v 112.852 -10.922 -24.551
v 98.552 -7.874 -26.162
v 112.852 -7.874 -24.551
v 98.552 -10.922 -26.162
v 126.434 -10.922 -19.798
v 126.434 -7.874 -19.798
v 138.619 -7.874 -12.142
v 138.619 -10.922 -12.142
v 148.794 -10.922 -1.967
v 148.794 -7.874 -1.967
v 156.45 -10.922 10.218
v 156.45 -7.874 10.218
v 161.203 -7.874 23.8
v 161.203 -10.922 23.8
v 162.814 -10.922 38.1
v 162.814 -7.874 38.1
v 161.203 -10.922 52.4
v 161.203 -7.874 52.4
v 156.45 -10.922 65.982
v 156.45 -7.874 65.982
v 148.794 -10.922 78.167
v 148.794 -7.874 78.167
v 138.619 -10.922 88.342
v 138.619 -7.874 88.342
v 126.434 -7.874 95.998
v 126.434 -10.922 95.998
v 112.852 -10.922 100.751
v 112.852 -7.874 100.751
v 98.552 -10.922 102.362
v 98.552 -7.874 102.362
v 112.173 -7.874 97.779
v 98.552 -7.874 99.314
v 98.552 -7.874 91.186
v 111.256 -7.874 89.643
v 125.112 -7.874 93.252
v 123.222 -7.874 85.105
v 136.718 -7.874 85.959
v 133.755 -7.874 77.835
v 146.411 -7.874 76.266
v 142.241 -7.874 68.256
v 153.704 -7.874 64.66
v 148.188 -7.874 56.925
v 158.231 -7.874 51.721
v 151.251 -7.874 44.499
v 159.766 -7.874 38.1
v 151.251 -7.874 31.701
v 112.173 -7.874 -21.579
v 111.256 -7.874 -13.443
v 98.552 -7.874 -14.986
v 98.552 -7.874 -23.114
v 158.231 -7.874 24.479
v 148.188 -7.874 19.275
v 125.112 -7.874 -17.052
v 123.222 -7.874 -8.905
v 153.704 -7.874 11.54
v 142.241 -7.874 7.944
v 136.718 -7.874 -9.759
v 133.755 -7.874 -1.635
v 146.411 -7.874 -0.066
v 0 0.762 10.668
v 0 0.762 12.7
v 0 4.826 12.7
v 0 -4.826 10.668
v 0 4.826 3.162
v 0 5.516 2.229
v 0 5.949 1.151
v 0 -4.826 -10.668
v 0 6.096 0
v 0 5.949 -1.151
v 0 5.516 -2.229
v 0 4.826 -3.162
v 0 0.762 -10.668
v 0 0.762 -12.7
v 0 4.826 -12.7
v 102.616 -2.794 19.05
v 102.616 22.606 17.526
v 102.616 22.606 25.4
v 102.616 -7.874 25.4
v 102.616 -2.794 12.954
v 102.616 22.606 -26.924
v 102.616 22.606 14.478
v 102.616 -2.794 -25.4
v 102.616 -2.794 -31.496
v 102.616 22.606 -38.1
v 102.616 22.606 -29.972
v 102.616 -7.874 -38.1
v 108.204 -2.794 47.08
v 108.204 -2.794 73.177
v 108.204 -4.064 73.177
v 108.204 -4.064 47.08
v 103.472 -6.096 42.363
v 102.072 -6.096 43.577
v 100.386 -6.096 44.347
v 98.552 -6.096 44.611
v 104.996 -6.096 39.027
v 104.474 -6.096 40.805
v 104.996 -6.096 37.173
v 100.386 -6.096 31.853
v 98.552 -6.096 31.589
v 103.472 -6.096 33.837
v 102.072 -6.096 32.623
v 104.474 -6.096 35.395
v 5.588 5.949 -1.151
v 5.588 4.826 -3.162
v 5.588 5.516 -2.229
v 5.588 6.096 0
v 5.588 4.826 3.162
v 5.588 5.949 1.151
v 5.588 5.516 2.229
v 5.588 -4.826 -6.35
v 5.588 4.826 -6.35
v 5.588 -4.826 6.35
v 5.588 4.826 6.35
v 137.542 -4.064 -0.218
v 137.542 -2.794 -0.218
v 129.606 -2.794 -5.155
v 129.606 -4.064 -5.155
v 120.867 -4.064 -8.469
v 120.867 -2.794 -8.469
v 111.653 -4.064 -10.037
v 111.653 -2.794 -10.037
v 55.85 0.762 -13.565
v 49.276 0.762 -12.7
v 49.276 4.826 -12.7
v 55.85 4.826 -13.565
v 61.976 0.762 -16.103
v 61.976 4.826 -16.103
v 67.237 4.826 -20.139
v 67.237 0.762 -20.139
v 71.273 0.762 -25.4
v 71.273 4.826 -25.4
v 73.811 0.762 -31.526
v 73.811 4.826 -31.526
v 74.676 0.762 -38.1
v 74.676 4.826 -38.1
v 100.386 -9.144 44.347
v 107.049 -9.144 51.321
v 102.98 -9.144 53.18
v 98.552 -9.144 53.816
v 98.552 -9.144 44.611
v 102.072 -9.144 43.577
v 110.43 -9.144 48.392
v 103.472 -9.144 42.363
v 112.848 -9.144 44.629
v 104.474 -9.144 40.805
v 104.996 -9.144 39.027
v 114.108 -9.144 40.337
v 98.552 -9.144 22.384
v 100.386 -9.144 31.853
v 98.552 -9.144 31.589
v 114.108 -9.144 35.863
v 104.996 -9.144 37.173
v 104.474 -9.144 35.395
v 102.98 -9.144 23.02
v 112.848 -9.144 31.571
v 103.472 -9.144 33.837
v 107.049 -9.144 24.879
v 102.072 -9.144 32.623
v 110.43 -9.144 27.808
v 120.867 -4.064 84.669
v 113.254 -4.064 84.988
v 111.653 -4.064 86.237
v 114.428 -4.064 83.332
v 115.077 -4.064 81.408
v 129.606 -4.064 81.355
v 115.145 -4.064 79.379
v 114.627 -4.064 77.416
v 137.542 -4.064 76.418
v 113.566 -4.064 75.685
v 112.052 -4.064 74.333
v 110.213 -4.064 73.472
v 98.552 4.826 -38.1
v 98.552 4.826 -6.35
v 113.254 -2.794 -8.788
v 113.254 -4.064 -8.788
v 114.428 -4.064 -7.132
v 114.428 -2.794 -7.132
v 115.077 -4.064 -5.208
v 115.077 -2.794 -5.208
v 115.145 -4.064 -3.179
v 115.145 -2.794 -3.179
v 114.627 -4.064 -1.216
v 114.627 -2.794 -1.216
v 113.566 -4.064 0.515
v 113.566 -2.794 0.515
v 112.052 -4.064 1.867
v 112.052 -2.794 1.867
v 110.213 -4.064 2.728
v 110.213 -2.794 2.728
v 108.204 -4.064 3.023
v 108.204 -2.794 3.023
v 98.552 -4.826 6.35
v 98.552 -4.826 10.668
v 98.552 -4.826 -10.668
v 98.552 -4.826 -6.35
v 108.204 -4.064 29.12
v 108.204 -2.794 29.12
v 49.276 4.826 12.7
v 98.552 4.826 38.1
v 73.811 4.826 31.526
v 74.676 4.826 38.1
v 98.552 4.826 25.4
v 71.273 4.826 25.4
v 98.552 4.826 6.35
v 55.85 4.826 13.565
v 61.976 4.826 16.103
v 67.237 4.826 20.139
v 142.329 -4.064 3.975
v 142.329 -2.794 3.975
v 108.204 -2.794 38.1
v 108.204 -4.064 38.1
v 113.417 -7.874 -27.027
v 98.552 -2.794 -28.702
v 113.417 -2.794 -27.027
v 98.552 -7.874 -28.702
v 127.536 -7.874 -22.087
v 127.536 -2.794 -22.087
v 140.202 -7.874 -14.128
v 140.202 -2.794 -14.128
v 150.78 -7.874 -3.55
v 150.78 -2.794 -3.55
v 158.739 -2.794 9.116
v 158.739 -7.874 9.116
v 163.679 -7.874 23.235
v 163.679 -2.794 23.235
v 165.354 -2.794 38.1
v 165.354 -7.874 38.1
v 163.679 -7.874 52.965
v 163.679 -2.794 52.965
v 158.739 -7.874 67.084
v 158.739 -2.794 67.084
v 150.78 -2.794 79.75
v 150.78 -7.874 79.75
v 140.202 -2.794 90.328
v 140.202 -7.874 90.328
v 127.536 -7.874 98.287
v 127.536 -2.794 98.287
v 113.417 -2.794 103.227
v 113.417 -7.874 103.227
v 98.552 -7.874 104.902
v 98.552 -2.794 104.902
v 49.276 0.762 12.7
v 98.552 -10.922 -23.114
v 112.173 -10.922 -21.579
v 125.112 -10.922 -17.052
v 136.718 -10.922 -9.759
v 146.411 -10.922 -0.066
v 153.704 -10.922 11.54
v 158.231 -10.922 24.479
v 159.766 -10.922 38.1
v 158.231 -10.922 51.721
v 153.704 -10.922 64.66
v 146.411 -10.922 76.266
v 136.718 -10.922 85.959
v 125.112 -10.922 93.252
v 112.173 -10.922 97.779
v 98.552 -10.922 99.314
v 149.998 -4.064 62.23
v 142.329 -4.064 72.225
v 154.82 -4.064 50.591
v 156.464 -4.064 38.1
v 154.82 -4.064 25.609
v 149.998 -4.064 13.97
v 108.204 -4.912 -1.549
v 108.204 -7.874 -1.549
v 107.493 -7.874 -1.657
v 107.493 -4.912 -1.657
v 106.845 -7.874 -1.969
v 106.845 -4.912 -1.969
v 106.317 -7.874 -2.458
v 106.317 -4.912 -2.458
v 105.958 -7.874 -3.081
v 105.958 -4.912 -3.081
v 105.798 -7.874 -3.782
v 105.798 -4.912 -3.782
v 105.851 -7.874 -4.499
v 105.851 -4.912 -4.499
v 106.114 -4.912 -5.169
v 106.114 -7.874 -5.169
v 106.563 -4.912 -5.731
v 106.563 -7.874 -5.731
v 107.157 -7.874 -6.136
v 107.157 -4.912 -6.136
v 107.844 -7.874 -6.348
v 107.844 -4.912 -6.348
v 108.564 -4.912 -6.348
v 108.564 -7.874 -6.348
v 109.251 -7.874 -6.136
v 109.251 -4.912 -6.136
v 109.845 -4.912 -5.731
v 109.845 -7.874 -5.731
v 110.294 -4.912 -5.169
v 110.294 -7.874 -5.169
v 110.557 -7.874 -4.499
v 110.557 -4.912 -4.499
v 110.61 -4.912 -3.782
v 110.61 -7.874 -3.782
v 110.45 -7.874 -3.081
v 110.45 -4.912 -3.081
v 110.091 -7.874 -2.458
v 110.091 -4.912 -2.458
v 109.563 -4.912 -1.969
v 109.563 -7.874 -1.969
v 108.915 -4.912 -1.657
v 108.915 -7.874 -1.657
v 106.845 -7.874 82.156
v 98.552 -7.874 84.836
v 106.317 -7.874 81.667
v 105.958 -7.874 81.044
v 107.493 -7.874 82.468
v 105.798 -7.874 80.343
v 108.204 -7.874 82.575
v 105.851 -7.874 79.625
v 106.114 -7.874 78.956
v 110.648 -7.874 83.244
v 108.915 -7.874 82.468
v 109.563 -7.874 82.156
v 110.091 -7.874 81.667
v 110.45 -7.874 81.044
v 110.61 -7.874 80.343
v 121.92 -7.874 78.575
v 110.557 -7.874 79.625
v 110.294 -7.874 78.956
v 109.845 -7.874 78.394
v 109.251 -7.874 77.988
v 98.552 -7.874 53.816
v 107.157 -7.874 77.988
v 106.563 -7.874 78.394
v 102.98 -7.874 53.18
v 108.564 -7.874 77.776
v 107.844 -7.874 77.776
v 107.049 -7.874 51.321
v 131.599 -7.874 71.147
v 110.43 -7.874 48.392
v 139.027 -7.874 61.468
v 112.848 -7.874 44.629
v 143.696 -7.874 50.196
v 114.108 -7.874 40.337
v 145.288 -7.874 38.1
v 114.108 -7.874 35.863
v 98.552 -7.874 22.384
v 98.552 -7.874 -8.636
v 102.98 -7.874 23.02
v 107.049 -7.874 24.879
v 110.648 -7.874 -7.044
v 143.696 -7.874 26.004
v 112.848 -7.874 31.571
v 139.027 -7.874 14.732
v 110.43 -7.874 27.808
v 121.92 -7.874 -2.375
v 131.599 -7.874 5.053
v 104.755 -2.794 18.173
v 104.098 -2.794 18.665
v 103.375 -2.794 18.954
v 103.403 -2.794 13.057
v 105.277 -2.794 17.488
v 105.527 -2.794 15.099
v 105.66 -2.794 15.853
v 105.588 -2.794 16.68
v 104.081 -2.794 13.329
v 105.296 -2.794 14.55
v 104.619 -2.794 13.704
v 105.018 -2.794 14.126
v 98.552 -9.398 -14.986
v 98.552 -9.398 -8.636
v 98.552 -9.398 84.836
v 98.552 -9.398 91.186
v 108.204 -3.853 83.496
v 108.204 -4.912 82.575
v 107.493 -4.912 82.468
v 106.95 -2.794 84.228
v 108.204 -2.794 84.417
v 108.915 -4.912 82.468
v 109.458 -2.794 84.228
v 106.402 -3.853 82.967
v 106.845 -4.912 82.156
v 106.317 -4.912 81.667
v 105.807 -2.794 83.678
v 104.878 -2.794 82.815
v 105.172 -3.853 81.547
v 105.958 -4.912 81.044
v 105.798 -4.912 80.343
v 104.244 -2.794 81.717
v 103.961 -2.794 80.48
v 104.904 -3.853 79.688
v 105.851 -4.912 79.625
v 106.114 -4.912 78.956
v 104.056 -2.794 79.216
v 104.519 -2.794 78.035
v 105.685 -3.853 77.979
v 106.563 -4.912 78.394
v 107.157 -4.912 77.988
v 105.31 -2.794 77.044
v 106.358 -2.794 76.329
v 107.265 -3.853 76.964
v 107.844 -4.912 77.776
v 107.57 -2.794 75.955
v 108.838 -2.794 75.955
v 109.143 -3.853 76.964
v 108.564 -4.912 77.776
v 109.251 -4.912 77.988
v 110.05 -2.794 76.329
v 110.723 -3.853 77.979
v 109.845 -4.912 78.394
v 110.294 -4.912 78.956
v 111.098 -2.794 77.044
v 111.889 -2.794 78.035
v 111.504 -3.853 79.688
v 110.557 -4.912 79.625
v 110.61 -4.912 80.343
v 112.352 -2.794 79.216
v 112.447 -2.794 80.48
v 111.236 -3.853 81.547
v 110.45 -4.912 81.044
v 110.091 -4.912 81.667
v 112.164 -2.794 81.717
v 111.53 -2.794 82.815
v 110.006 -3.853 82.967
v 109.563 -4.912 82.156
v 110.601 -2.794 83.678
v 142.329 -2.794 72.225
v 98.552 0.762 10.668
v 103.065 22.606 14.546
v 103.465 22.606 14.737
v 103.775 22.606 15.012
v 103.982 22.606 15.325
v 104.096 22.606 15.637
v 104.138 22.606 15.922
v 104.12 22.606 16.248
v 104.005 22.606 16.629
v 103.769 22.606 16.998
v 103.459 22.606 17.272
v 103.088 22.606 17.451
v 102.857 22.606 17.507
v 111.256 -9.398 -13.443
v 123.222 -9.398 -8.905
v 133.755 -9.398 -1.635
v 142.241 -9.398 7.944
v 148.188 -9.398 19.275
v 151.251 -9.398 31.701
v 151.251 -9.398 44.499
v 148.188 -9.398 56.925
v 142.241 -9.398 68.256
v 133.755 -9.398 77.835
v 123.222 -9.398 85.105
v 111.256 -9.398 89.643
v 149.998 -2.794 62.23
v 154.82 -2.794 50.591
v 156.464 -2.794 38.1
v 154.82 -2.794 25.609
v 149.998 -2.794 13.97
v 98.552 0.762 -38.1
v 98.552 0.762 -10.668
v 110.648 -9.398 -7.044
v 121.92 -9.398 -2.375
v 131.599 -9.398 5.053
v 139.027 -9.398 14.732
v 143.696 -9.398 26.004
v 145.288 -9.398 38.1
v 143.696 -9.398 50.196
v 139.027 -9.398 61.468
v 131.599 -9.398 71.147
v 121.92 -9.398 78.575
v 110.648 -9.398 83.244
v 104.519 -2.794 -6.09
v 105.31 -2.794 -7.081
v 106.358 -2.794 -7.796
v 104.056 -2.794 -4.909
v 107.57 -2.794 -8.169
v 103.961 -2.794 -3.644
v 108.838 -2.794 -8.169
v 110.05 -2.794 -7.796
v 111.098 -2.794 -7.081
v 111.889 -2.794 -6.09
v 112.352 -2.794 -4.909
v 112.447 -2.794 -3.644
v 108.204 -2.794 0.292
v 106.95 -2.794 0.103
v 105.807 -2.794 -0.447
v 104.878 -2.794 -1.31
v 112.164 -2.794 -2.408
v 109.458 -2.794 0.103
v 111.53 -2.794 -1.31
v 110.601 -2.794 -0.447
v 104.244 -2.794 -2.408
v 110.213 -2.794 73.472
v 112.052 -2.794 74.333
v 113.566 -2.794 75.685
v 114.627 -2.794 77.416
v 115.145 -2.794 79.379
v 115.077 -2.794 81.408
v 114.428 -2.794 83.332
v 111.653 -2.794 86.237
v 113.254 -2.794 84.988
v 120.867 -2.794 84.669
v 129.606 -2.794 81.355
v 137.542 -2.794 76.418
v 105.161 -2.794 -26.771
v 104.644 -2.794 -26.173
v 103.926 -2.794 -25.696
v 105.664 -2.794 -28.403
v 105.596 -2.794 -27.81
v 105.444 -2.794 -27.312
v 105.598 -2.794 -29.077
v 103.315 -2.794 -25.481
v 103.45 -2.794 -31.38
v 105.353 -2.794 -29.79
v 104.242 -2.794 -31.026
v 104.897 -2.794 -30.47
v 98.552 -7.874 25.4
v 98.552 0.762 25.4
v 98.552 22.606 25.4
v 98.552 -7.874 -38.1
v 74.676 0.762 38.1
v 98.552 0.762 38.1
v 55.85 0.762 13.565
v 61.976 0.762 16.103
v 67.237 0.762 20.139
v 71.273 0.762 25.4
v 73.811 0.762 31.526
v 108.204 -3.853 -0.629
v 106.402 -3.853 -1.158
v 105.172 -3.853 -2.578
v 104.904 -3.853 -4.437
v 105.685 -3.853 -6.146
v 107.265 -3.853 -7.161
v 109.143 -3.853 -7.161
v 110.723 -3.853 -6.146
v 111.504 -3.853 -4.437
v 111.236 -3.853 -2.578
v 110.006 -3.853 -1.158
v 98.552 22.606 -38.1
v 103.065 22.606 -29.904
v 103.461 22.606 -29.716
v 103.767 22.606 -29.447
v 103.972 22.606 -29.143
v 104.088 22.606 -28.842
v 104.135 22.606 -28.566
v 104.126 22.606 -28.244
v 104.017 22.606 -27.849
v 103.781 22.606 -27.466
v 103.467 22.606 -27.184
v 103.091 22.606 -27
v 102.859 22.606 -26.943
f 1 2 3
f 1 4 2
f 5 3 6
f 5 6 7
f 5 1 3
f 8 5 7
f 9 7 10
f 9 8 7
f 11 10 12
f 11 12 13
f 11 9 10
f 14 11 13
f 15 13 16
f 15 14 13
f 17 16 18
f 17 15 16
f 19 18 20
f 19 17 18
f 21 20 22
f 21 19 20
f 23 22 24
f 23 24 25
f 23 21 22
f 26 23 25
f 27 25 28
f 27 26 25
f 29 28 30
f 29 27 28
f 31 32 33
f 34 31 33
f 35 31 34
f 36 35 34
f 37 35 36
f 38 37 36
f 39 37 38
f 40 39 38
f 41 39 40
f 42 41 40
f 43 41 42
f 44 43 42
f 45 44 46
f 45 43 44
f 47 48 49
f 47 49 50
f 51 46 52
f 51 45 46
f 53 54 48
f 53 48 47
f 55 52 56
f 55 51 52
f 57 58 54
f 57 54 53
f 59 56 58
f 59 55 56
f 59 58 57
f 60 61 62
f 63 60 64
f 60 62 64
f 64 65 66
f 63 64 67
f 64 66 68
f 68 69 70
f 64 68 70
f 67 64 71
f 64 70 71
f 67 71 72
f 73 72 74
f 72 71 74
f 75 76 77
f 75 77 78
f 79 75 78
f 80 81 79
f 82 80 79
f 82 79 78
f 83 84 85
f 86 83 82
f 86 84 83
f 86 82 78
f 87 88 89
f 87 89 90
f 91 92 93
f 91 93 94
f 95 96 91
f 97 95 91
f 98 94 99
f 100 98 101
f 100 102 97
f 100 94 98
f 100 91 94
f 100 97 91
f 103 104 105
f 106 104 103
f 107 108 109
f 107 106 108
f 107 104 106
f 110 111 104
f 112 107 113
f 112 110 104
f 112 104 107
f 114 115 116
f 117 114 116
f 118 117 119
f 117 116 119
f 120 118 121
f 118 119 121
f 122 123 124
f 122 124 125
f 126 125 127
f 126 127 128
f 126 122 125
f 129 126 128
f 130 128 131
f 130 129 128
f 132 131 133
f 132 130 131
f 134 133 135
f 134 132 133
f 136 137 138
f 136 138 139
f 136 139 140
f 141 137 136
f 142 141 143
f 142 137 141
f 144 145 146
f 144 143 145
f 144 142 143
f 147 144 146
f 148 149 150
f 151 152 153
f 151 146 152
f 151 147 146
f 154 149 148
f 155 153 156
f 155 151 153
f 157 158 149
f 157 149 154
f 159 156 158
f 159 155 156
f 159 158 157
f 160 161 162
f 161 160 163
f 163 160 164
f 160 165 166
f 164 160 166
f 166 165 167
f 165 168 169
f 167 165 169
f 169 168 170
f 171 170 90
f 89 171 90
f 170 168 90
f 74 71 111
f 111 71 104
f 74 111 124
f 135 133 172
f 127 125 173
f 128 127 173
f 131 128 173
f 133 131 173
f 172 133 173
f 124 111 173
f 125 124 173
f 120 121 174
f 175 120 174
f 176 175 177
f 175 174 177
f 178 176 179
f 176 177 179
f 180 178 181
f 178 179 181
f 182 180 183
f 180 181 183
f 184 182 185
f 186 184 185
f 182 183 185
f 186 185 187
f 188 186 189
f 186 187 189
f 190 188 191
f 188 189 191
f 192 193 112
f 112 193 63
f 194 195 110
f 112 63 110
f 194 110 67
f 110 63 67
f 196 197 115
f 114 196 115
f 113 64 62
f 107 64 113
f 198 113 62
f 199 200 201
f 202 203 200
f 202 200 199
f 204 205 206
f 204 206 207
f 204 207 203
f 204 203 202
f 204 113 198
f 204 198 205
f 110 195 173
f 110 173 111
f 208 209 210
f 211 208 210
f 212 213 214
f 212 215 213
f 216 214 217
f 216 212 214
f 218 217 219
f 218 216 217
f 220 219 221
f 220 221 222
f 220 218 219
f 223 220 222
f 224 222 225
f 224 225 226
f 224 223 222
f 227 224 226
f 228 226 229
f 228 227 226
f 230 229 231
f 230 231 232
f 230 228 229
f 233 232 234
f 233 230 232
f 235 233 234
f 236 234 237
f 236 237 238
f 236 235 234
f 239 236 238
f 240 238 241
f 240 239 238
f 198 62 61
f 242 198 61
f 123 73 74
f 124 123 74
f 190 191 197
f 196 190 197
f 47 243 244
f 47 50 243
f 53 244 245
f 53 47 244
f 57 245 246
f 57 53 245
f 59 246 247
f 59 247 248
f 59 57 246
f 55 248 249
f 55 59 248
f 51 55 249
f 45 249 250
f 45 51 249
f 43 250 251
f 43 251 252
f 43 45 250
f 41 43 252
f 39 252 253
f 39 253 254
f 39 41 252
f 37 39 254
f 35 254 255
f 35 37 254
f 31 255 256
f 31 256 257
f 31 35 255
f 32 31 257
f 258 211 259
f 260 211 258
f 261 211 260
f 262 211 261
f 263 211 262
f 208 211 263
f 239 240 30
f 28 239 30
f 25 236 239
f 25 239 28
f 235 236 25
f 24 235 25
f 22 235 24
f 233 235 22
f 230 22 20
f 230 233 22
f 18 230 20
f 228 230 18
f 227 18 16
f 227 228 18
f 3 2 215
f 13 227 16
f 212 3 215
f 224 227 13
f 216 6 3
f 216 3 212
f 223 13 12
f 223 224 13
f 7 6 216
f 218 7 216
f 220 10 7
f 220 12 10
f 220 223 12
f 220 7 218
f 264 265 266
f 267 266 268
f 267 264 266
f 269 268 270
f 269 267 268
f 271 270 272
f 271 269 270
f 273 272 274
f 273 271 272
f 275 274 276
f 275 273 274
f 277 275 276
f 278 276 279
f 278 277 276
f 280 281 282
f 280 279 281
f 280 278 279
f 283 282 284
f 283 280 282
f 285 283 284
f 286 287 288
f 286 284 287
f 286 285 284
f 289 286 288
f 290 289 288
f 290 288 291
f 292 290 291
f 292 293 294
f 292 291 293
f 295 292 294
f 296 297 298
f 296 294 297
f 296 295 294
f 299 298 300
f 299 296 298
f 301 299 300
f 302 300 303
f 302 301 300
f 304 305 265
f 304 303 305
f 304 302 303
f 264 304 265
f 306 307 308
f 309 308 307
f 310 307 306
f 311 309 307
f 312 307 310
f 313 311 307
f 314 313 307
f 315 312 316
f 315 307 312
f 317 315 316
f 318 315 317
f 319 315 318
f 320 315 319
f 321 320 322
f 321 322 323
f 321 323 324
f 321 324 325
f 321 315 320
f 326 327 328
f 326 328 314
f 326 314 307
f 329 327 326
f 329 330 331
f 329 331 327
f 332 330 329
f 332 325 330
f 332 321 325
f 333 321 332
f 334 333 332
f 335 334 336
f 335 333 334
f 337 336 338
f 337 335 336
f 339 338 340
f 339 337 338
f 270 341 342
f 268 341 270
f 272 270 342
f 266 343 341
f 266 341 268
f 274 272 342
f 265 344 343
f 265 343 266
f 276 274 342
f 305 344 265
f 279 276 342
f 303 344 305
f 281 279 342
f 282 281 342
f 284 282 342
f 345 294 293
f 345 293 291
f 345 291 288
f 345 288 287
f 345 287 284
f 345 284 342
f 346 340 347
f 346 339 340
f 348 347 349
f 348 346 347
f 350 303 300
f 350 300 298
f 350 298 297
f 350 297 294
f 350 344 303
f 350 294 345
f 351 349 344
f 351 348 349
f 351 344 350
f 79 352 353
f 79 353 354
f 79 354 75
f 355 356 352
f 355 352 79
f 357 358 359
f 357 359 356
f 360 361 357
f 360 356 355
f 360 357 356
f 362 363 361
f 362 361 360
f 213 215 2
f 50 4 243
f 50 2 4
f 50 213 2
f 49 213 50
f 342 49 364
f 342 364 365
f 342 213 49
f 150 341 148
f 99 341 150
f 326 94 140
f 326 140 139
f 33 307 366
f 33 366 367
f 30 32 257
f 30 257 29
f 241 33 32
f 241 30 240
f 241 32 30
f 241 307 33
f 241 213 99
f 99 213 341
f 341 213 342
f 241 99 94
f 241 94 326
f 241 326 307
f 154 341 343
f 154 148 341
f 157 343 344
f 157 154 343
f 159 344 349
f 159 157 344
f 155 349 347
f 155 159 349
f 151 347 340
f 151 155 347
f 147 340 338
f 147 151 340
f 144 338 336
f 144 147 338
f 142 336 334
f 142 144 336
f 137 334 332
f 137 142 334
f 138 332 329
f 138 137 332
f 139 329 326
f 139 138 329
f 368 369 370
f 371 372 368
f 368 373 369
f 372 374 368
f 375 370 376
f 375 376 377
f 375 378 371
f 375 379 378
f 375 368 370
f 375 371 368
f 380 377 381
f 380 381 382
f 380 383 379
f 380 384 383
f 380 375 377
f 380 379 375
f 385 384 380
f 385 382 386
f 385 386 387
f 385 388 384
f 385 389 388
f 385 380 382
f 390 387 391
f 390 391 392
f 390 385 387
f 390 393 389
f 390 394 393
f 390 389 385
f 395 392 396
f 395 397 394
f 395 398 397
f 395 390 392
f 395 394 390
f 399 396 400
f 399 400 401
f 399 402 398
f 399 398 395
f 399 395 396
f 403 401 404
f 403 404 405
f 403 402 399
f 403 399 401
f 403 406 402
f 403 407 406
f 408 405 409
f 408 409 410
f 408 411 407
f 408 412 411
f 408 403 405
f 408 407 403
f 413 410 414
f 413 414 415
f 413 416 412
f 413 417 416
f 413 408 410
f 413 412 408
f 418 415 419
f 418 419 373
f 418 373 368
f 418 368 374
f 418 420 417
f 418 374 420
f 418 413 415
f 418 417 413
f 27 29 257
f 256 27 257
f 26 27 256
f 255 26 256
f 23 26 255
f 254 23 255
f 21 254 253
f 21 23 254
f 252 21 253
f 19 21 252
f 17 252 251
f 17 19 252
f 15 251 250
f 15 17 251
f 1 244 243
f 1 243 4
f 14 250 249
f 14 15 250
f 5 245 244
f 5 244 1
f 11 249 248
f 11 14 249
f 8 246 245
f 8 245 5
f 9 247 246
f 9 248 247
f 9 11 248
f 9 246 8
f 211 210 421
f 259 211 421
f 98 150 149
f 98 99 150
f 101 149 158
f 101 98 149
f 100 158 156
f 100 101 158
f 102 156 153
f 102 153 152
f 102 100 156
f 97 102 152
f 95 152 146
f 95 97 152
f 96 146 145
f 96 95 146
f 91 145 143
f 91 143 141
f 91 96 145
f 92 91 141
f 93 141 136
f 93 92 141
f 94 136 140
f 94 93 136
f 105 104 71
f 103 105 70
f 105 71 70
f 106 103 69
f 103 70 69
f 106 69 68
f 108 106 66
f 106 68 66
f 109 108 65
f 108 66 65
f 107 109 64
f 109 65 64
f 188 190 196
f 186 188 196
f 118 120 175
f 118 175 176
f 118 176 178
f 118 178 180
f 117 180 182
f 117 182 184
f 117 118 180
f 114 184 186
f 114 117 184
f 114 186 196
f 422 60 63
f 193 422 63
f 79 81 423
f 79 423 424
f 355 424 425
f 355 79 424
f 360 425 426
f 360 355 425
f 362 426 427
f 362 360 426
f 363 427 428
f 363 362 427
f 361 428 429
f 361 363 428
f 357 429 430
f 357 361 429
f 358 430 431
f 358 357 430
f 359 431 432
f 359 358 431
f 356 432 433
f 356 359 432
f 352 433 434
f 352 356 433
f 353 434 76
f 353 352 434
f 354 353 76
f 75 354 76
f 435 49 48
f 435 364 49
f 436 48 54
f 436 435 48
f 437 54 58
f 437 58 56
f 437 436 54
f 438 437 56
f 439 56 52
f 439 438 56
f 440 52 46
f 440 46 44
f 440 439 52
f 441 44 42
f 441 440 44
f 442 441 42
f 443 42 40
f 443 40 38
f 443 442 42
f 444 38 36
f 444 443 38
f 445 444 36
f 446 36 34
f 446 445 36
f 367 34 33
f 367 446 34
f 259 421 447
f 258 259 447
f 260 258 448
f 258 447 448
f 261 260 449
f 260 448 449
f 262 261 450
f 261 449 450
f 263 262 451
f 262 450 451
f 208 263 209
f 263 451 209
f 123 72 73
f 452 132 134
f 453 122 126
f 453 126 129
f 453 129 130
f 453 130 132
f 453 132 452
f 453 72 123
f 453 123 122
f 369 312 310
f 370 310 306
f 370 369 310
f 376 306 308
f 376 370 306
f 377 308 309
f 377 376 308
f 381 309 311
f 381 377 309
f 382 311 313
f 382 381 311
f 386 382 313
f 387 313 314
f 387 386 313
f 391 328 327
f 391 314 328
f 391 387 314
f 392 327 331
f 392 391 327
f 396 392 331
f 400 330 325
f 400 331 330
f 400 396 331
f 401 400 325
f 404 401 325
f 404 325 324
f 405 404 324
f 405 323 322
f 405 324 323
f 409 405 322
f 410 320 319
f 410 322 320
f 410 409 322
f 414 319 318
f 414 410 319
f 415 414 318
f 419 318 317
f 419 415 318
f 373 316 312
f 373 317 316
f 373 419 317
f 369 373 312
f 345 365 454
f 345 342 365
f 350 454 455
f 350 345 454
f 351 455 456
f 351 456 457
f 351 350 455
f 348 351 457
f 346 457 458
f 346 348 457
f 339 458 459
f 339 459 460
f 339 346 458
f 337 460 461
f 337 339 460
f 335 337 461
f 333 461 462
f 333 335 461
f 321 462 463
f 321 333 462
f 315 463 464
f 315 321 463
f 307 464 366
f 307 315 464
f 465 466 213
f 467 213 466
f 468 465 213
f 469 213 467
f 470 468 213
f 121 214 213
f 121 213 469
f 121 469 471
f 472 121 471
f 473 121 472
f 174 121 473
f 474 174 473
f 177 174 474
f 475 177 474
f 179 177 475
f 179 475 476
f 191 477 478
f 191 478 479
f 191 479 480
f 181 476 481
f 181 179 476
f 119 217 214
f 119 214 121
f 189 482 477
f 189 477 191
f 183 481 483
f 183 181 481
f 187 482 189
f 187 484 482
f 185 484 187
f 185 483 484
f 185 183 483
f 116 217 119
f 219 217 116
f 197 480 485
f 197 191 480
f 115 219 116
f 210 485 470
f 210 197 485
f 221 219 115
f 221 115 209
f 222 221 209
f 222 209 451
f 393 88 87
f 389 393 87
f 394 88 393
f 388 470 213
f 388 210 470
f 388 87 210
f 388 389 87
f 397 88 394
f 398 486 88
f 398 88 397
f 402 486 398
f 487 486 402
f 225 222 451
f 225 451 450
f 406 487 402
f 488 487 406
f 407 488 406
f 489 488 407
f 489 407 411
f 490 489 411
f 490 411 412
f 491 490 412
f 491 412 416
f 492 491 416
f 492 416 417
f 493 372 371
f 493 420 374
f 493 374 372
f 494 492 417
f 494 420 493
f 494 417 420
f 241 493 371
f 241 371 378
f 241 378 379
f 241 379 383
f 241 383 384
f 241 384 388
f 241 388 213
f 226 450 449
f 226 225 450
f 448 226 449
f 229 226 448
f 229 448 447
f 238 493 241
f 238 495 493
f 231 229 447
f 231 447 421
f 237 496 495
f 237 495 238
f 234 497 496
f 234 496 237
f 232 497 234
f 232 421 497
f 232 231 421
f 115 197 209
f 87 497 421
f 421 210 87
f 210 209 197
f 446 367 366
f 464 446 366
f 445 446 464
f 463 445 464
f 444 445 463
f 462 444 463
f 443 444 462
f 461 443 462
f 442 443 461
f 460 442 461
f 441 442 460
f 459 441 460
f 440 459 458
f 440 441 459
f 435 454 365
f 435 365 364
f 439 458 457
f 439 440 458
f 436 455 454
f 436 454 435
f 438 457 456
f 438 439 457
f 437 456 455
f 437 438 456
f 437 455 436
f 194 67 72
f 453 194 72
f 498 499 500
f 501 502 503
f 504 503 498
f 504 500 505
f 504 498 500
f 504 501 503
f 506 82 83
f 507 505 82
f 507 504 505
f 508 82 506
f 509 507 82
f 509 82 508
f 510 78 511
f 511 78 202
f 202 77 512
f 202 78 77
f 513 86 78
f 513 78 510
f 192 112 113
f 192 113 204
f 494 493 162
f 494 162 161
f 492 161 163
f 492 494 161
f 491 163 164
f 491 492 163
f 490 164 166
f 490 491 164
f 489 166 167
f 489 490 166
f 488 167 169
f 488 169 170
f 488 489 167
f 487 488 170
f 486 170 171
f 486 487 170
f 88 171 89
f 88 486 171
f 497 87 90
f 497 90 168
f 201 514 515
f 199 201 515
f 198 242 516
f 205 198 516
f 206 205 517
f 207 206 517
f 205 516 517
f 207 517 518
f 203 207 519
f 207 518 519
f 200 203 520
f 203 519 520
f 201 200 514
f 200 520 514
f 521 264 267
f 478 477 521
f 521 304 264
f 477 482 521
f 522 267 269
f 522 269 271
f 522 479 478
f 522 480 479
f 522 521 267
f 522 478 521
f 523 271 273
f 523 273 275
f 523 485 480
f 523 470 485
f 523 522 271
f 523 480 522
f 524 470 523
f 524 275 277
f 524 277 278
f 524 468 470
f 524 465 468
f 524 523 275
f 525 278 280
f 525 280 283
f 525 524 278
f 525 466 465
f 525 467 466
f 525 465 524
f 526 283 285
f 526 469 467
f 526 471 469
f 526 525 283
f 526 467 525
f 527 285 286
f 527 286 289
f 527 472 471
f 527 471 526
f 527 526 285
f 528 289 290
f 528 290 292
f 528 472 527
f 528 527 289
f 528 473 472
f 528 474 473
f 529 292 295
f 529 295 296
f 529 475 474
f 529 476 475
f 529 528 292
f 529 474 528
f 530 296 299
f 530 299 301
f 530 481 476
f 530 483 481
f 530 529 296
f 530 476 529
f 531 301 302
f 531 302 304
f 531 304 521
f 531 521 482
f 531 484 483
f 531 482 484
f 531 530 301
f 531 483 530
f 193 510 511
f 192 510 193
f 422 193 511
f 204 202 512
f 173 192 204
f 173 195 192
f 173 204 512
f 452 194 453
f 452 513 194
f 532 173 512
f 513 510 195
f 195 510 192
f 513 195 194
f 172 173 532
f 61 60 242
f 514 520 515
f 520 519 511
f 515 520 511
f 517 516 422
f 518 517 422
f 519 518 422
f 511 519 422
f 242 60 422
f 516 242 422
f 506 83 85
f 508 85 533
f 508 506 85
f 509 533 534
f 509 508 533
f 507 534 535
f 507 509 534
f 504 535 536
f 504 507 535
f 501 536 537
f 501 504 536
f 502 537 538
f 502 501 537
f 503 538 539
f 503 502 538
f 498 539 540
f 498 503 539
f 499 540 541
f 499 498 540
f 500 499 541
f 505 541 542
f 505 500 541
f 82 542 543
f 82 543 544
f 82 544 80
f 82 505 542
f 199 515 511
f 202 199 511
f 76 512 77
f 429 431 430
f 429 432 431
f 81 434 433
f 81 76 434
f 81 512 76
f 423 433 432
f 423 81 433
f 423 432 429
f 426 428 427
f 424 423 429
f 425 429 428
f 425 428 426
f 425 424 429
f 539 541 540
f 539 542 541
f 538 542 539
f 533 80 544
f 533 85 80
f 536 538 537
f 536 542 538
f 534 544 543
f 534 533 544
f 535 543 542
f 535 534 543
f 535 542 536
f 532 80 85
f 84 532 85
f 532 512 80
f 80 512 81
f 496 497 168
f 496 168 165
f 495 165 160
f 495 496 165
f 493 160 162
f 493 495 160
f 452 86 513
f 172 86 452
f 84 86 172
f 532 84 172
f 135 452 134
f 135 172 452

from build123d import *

# Parameters (mm, degrees)
BOSS_EXTRUDE1_DEPTH                           = 98.552
CUT_EXTRUDE2_DEPTH                            = 100.834602258
CUT_EXTRUDE2_DEPTH_BACK                       = 100.834602258
SKETCH2_W                                     = 92.964
SKETCH2_H                                     = 3.187725502
BOSS_EXTRUDE2_START                           = -4.064
BOSS_EXTRUDE2_DEPTH                           = 4.064
SKETCH10_W                                    = 4.064
SKETCH10_H                                    = 8.636
BOSS_EXTRUDE3_DEPTH                           = 63.5
REVOLVE1_ANGLE                                = 180
CUT_EXTRUDE3_DEPTH                            = 1.27
CSK_FOR_1_FLAT_HEAD_SOCKET_CAP_SCREW1_A_COUNT = 2
CSK_FOR_1_FLAT_HEAD_SOCKET_CAP_SCREW1_A_PITCH = 84.1248


with BuildPart() as part:
    # Sketch1 → Boss-Extrude1 (new body)
    with BuildSketch(Plane(origin=(0, 0, 0), x_dir=(0, 0, -1), z_dir=(1, 0, 0))):
        with BuildLine():
            Line((-10.668, -4.826), (10.668, -4.826))
            Line((10.668, -4.826), (10.668, 0.762))
            Line((10.668, 0.762), (12.7, 0.762))
            Line((12.7, 0.762), (12.7, 4.826))
            Line((12.7, 4.826), (3.162274498, 4.826))
            ThreePointArc((3.162274498, 4.826), (0, 6.096), (-3.162274498, 4.826))
            Line((-3.162274498, 4.826), (-12.7, 4.826))
            Line((-12.7, 4.826), (-12.7, 0.762))
            Line((-12.7, 0.762), (-10.668, 0.762))
            Line((-10.668, 0.762), (-10.668, -4.826))
        make_face()
    extrude(amount=BOSS_EXTRUDE1_DEPTH)

    # Sketch2 → Cut-Extrude2 (cut, two sides: drawn at the far end of the back side and taken through both)
    with BuildSketch(Plane(origin=(0, 4.826, 0), x_dir=(1, 0, 0), z_dir=(0, 1, 0)).offset(-CUT_EXTRUDE2_DEPTH_BACK)):
        with Locations((52.07, -4.756137249)):
            Rectangle(SKETCH2_W, SKETCH2_H)
        Polygon((5.588, 6.35), (5.588, 0), (5.588, -3.162274498), (98.552, -3.162274498), (98.552, 6.35), align=None)
    extrude(amount=CUT_EXTRUDE2_DEPTH + CUT_EXTRUDE2_DEPTH_BACK, mode=Mode.SUBTRACT)

    # Sketch3 → Boss-Extrude2 (add)
    with BuildSketch(Plane(origin=(0, 4.826, 0), x_dir=(1, 0, 0), z_dir=(0, 1, 0)).offset(BOSS_EXTRUDE2_START)):
        with BuildLine():
            Line((98.552, -12.7), (49.276, -12.7))
            ThreePointArc((49.276, -12.7), (67.236512242, -20.139487758), (74.676, -38.1))
            Line((74.676, -38.1), (98.552, -38.1))
            Line((98.552, -38.1), (98.552, -12.7))
        make_face()
    boss_extrude2 = extrude(amount=BOSS_EXTRUDE2_DEPTH)

    # Mirror1: Boss-Extrude2 across plane
    add(boss_extrude2.mirror(Plane.XY))

    # Sketch10 → Boss-Extrude3 (add)
    with BuildSketch(Plane(origin=(0, 0, -38.1), x_dir=(-1, 0, 0), z_dir=(0, 0, -1))):
        Polygon((-102.616, 0.762), (-98.552, 0.762), (-98.552, 4.826), (-98.552, 22.606), (-102.616, 22.606), align=None)
        with Locations((-100.584, -3.556)):
            Rectangle(SKETCH10_W, SKETCH10_H)
    extrude(amount=-BOSS_EXTRUDE3_DEPTH)

    # Loft1: read off the stored shape, not the designer's step
    # Loft1: loft between two sections, ruled curve by curve
    loft1_from = [
        Edge.make_bspline([(101.095067692, 22.606, -28.544648401), (101.288364493, 22.606, -31.586513017), (104.33022911, 22.606, -31.393216216), (104.136932308, 22.606, -28.351351599), (103.943635507, 22.606, -25.309486983), (100.90177089, 22.606, -25.502783784), (101.095067692, 22.606, -28.544648401)], [0.5, 0.5, 0.5, 0.5, 1, 1, 1, 1.5, 1.5, 1.5, 1.5], 3, [1, 0.333333333, 0.333333333, 1, 0.333333333, 0.333333333, 1]),
    ]
    loft1_to = [
        Edge.make_bspline([(99.932204152, -2.794, -29.8928335), (102.821871152, -2.794, -35.260425197), (108.189462849, -2.794, -32.370758196), (105.299795848, -2.794, -27.0031665), (102.410128848, -2.794, -21.635574803), (97.042537151, -2.794, -24.525241804), (99.932204152, -2.794, -29.8928335)], [0.5, 0.5, 0.5, 0.5, 1, 1, 1, 1.5, 1.5, 1.5, 1.5], 3, [1, 0.333333333, 0.333333333, 1, 0.333333333, 0.333333333, 1]),
    ]
    loft1 = Solid(Shell([*[Face.make_surface_from_curves(loft1_from[k], loft1_to[k]) for k in range(1)], Face(Wire(loft1_from)), Face(Wire(loft1_to))]))
    add(loft1)

    # Loft2: read off the stored shape, not the designer's step
    # Loft2: loft between two sections, ruled curve by curve
    loft2_from = [
        Edge.make_bspline([(101.103424589, 22.606, 15.815743121), (101.475938347, 22.606, 12.790592298), (104.50108917, 22.606, 13.163106056), (104.128575411, 22.606, 16.188256879), (103.756061653, 22.606, 19.213407702), (100.73091083, 22.606, 18.840893944), (101.103424589, 22.606, 15.815743121)], [0.5, 0.5, 0.5, 0.5, 1, 1, 1, 1.5, 1.5, 1.5, 1.5], 3, [1, 0.333333333, 0.333333333, 1, 0.333333333, 0.333333333, 1]),
    ]
    loft2_to = [
        Edge.make_bspline([(99.789147173, -2.794, 17.141827659), (97.509491854, -2.794, 11.488122004), (103.163197509, -2.794, 9.208466686), (105.442852827, -2.794, 14.862172341), (107.722508146, -2.794, 20.515877996), (102.068802491, -2.794, 22.795533314), (99.789147173, -2.794, 17.141827659)], [0.5, 0.5, 0.5, 0.5, 1, 1, 1, 1.5, 1.5, 1.5, 1.5], 3, [1, 0.333333333, 0.333333333, 1, 0.333333333, 0.333333333, 1]),
    ]
    loft2 = Solid(Shell([*[Face.make_surface_from_curves(loft2_from[k], loft2_to[k]) for k in range(1)], Face(Wire(loft2_from)), Face(Wire(loft2_to))]))
    add(loft2)


with BuildPart() as body_2:
    # Sketch17 → Revolve1 (revolve)
    with BuildSketch(Plane.ZY.offset(-98.552)):
        Polygon((-26.162, -10.922), (-23.114, -10.922), (-23.114, -7.874), (-14.986, -7.874), (-14.986, -9.398), (-8.636, -9.398), (-8.636, -7.874), (22.383656596, -7.874), (22.383656596, -9.144), (31.589471145, -9.144), (31.589471145, -6.096), (38.1, -6.096), (38.1, -2.794), (-28.702, -2.794), (-28.702, -7.874), (-26.162, -7.874), align=None)
    revolve(axis=Axis((98.552, -6.096, 38.1), (0, -1, 0)), revolution_arc=REVOLVE1_ANGLE)

    # Sketch19 → Cut-Extrude3 (cut)
    with BuildSketch(Plane(origin=(0, -2.794, 0), x_dir=(1, 0, 0), z_dir=(0, 1, 0))):
        with BuildLine():
            Line((108.204, -38.1), (142.32897326, -72.22497326))
            ThreePointArc((142.32897326, -72.22497326), (156.464, -38.1), (142.32897326, -3.97502674))
            Line((142.32897326, -3.97502674), (108.204, -38.1))
        make_face()
        with BuildLine():
            Line((108.204, -47.080256121), (137.542152268, -76.418408389))
            ThreePointArc((137.542152268, -76.418408389), (125.316721094, -83.224077572), (111.652792819, -86.236612138))
            ThreePointArc((111.652792819, -86.236612138), (114.957465658, -78.378884761), (108.204, -73.1774))
            Line((108.204, -73.1774), (108.204, -47.080256121))
        make_face()
        with BuildLine():
            Line((108.204, -29.119743879), (137.542152268, 0.218408389))
            ThreePointArc((137.542152268, 0.218408389), (125.316721094, 7.024077572), (111.652792819, 10.036612138))
            ThreePointArc((111.652792819, 10.036612138), (114.957465658, 2.178884761), (108.204, -3.0226))
            Line((108.204, -3.0226), (108.204, -29.119743879))
        make_face()
    extrude(amount=-CUT_EXTRUDE3_DEPTH, mode=Mode.SUBTRACT)

    # Sketch21 → CSK for #1 Flat Head Socket Cap Screw1 (revolve, cut)
    with BuildSketch(Plane(origin=(108.204, -2.794, 80.1624), x_dir=(0, 0, 1), z_dir=(1, 0, 0))):
        Polygon((0, 0), (0, 8.128), (2.413, 8.128), (2.413, 2.118403422), (4.2545, 0), align=None)
    csk_for_1_flat_head_socket_cap_screw1 = revolve(axis=Axis((108.204, 3.556, 80.1624), (0, -1, 0)), mode=Mode.SUBTRACT)

    # CSK for #1 Flat Head Socket Cap Screw1 a: CSK for #1 Flat Head Socket Cap Screw1 ×2
    with Locations(*[(0, 0, -i * CSK_FOR_1_FLAT_HEAD_SOCKET_CAP_SCREW1_A_PITCH) for i in range(1, CSK_FOR_1_FLAT_HEAD_SOCKET_CAP_SCREW1_A_COUNT)]):
        add(csk_for_1_flat_head_socket_cap_screw1, mode=Mode.SUBTRACT)


solid = Compound([part.part, body_2.part])
